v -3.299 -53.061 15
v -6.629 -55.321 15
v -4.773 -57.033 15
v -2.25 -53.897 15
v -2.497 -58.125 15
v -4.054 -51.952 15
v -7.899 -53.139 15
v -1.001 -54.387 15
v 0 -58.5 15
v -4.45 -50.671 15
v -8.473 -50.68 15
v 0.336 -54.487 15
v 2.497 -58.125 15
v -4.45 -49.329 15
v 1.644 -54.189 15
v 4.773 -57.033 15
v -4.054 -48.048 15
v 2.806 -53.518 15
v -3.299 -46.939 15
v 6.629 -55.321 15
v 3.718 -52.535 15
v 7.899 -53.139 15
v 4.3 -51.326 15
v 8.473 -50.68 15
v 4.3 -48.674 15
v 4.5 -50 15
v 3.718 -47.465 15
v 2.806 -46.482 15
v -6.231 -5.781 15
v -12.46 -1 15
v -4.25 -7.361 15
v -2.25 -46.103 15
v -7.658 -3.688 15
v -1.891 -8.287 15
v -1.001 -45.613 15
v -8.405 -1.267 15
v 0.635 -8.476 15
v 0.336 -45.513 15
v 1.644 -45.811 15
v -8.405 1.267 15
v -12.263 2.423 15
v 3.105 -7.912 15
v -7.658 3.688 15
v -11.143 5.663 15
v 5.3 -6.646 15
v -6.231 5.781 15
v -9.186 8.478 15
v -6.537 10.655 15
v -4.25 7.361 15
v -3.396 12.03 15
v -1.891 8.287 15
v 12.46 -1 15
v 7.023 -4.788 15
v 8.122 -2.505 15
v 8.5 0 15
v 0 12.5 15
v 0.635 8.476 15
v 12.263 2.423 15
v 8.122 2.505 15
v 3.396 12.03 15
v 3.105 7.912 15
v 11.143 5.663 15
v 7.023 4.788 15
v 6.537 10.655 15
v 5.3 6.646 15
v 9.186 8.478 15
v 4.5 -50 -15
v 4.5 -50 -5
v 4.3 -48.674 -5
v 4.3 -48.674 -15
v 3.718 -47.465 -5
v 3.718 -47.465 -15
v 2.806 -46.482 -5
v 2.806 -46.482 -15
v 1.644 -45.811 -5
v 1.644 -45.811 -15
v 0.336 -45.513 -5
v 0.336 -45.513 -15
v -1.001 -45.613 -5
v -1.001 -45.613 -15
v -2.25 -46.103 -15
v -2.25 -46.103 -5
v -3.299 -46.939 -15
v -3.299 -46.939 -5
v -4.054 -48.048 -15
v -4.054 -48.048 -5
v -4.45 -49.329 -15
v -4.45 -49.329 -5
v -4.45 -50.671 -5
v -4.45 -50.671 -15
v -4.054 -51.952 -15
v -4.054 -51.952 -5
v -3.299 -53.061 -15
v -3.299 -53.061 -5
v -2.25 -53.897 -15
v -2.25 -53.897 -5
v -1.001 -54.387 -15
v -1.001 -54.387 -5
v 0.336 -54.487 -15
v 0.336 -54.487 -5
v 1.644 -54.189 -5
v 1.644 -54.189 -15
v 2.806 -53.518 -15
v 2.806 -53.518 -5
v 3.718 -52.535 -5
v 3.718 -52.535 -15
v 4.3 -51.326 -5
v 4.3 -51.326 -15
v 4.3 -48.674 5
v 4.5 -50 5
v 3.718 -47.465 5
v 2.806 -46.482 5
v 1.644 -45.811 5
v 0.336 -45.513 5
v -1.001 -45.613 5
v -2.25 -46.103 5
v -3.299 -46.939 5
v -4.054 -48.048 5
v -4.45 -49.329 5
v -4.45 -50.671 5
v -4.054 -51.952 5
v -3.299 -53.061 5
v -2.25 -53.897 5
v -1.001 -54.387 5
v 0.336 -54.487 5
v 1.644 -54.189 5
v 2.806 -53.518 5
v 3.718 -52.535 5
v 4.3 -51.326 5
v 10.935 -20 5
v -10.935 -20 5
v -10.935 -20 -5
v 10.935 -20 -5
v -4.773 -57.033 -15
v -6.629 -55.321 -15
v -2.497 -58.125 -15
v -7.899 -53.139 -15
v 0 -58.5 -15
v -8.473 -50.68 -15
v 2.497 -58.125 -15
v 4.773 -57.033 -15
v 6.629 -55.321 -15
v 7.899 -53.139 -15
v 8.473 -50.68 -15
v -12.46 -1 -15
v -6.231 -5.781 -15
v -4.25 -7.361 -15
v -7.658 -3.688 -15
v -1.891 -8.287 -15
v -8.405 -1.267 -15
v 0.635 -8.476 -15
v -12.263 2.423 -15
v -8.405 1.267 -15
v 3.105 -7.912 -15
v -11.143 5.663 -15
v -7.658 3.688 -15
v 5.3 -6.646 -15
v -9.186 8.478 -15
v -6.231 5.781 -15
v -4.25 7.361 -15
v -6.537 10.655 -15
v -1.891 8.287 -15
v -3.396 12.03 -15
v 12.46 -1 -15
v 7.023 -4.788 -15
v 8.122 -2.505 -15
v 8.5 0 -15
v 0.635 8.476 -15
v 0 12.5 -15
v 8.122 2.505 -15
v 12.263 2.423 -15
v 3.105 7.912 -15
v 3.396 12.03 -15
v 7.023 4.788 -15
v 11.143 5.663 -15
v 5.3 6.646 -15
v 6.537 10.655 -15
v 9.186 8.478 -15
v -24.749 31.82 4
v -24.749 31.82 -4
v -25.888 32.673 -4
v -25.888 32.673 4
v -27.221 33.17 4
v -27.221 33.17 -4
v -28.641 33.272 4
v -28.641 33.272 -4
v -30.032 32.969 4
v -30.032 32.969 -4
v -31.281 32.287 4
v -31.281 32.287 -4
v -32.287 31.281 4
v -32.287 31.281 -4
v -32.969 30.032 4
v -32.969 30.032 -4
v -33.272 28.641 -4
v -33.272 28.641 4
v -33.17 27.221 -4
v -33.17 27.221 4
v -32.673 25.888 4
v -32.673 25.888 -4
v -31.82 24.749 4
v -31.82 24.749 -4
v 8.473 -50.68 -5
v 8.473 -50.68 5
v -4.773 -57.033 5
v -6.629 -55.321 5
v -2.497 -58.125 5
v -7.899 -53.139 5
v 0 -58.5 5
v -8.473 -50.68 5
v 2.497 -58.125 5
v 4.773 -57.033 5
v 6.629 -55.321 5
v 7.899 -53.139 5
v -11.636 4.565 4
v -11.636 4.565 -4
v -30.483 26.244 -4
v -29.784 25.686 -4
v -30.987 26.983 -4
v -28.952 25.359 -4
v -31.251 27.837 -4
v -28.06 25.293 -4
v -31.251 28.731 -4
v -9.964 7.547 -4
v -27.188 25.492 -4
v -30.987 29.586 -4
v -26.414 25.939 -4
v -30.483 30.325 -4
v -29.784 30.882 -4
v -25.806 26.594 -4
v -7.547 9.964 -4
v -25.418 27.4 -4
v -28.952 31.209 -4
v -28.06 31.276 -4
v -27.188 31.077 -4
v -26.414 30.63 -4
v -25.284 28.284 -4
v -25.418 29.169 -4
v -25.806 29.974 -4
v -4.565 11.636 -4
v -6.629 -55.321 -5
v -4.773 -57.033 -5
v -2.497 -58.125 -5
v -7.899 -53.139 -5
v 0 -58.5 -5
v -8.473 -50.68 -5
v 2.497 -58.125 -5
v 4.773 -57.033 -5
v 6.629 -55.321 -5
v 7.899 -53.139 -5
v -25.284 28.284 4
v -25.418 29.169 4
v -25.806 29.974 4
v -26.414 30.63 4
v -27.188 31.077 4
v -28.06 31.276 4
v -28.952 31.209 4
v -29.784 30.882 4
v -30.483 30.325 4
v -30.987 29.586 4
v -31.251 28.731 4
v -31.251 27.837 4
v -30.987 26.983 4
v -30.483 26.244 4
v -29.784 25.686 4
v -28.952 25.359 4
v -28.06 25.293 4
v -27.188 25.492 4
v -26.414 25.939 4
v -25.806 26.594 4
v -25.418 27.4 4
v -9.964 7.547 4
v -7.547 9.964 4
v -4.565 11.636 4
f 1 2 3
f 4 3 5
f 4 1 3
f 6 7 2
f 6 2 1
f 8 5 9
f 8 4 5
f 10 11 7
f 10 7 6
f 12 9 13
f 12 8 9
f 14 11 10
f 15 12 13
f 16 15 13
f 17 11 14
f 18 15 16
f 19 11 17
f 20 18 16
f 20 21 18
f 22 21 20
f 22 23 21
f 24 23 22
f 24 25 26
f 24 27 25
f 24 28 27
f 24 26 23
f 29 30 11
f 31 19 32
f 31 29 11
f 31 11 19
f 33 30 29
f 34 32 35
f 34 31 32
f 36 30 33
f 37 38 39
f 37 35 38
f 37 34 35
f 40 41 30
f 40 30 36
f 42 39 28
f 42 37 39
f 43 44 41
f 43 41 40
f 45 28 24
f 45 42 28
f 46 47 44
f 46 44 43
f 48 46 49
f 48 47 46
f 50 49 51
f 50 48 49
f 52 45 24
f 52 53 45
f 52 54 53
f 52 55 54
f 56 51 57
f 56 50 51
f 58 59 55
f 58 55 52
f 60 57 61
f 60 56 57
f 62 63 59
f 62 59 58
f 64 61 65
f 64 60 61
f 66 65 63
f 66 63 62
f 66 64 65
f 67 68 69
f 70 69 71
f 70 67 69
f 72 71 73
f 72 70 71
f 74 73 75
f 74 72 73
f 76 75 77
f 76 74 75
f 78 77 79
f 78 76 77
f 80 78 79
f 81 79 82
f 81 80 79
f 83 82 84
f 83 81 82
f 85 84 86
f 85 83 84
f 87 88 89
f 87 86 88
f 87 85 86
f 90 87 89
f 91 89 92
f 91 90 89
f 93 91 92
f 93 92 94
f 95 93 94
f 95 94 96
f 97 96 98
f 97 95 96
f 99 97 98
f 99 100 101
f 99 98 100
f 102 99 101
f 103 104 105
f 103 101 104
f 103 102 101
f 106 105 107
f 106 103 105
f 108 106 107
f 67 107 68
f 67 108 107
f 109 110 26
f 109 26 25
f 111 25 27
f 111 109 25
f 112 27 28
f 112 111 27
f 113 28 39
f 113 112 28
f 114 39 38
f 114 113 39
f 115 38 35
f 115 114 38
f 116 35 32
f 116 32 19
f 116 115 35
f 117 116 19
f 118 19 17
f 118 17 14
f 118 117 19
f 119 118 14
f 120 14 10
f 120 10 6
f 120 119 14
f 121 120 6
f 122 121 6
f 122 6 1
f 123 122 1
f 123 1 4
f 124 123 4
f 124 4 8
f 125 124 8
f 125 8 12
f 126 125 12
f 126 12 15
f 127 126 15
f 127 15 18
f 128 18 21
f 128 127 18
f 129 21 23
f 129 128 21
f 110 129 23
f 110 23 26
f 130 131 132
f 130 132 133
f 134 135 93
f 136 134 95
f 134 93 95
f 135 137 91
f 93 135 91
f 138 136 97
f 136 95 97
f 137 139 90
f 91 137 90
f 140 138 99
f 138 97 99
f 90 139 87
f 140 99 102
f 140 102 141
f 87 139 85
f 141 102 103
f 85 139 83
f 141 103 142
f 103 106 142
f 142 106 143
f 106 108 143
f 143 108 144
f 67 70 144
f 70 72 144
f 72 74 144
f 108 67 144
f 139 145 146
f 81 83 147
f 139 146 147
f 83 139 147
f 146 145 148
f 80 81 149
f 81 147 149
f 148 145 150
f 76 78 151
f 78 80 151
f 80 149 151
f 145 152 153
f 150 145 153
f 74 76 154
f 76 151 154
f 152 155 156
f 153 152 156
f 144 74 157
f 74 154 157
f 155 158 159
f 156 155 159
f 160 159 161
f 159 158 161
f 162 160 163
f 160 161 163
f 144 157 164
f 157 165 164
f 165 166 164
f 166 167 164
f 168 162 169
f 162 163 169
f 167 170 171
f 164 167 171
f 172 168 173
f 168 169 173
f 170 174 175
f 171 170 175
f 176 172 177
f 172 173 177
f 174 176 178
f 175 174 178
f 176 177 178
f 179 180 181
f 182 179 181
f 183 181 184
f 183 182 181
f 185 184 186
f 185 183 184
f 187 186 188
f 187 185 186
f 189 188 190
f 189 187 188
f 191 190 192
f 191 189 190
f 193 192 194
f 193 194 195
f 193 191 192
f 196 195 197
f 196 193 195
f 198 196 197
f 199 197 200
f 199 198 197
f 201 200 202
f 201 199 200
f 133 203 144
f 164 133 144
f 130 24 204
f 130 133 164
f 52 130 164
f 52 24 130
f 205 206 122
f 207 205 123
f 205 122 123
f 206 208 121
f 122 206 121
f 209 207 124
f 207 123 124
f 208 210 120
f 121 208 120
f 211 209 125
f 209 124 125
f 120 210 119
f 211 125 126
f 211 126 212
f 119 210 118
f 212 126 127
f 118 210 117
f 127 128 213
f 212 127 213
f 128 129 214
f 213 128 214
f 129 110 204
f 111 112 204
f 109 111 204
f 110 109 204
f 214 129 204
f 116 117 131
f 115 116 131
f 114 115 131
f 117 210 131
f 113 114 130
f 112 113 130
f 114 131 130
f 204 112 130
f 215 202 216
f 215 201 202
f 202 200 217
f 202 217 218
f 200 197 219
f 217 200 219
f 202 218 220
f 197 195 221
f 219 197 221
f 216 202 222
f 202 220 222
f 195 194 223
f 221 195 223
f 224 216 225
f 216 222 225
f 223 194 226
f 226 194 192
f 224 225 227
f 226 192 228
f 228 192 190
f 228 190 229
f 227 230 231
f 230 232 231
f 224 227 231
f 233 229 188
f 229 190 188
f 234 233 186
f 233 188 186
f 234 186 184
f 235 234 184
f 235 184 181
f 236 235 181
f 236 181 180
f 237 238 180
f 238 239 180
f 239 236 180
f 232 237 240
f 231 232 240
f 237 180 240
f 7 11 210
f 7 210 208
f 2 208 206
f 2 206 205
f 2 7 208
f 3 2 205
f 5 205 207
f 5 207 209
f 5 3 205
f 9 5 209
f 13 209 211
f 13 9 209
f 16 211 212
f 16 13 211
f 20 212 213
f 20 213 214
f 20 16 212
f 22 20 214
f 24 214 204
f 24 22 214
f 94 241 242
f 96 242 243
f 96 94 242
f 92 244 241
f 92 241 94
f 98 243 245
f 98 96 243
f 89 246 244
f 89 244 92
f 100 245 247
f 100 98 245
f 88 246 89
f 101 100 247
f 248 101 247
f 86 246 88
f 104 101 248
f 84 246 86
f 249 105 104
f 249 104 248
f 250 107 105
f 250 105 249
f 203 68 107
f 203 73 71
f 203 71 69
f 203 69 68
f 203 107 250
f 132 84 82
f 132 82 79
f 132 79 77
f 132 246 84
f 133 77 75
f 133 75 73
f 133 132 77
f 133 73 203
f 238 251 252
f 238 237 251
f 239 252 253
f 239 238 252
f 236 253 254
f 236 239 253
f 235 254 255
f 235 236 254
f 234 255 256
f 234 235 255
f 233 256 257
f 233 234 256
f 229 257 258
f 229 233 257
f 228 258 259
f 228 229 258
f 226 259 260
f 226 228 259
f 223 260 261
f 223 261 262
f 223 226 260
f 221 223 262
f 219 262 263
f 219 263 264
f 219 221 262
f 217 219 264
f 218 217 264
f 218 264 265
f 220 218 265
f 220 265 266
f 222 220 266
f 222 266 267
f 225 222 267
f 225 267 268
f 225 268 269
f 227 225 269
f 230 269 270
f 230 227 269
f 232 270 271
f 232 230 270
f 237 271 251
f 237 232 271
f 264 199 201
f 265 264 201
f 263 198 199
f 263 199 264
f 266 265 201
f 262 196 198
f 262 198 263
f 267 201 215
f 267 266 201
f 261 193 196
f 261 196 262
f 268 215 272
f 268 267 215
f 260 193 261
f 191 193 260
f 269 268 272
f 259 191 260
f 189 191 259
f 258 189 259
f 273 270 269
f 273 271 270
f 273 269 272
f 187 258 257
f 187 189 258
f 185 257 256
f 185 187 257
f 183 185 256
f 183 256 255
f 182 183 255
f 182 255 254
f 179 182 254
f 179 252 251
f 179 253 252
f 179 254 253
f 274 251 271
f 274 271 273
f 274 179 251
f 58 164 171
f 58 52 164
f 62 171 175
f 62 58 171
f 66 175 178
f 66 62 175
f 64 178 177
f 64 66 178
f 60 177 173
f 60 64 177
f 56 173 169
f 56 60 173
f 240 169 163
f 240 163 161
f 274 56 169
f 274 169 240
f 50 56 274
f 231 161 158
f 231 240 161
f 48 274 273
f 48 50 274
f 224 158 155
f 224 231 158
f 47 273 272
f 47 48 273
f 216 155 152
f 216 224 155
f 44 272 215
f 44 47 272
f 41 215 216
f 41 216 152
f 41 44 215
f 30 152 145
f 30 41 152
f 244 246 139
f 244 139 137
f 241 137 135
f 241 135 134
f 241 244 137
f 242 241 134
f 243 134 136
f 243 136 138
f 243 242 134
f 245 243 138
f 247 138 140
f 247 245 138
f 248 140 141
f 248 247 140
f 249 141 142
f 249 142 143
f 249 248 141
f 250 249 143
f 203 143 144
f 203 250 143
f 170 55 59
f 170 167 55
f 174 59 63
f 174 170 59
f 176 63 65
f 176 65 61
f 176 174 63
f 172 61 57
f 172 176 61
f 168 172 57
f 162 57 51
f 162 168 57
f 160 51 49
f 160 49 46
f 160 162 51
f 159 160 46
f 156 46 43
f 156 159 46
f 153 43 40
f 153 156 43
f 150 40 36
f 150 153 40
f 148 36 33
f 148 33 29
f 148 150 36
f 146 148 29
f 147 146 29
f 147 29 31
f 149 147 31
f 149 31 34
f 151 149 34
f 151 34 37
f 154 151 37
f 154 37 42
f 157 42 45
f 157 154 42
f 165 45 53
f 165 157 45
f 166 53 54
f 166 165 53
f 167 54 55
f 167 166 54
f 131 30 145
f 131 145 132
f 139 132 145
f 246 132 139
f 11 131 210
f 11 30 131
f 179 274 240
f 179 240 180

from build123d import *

# Parameters (mm, degrees)
SKETCH_1_R          = 8.5
SKETCH_1_R_2        = 4.5
EXTRUDE_1_DEPTH     = 15
SKETCH_2_W          = 30
SKETCH_2_H          = 60
CUT_EXTRUDE_1_DEPTH = 5
SKETCH_3_R          = 3
EXTRUDE_2_DEPTH     = 4


with BuildPart() as part:
    # Эскиз1 → Бобышка-Вытянуть1 (new, symmetric)
    with BuildSketch(Plane.XY):
        with BuildLine():
            ThreePointArc((12.459935794, -1), (0, 12.5), (-12.459935794, -1))
            Line((-12.459935794, -1), (-8.47275634, -50.68))
            ThreePointArc((-8.47275634, -50.68), (0, -58.5), (8.47275634, -50.68))
            Line((8.47275634, -50.68), (12.459935794, -1))
        make_face()
        Circle(SKETCH_1_R, mode=Mode.SUBTRACT)
        with Locations((0, -50)):
            Circle(SKETCH_1_R_2, mode=Mode.SUBTRACT)
    extrude(amount=EXTRUDE_1_DEPTH, both=True)

    # Эскиз2 → Вырез-Вытянуть1 (cut, symmetric)
    with BuildSketch(Plane.XY):
        with Locations((0, -50)):
            Rectangle(SKETCH_2_W, SKETCH_2_H)
    extrude(amount=CUT_EXTRUDE_1_DEPTH, both=True, mode=Mode.SUBTRACT)

    # Эскиз3 → Бобышка-Вытянуть2 (add, symmetric)
    with BuildSketch(Plane.XY):
        with BuildLine():
            Line((-31.819805153, 24.748737342), (-11.636459779, 4.565391967))
            ThreePointArc((-11.636459779, 4.565391967), (-8.838834765, 8.838834765), (-4.565391967, 11.636459779))
            Line((-4.565391967, 11.636459779), (-24.748737342, 31.819805153))
            ThreePointArc((-24.748737342, 31.819805153), (-31.819805153, 31.819805153), (-31.819805153, 24.748737342))
        make_face()
        with Locations((-28.284271247, 28.284271247)):
            Circle(SKETCH_3_R, mode=Mode.SUBTRACT)
    extrude(amount=EXTRUDE_2_DEPTH, both=True)


solid = part.part
